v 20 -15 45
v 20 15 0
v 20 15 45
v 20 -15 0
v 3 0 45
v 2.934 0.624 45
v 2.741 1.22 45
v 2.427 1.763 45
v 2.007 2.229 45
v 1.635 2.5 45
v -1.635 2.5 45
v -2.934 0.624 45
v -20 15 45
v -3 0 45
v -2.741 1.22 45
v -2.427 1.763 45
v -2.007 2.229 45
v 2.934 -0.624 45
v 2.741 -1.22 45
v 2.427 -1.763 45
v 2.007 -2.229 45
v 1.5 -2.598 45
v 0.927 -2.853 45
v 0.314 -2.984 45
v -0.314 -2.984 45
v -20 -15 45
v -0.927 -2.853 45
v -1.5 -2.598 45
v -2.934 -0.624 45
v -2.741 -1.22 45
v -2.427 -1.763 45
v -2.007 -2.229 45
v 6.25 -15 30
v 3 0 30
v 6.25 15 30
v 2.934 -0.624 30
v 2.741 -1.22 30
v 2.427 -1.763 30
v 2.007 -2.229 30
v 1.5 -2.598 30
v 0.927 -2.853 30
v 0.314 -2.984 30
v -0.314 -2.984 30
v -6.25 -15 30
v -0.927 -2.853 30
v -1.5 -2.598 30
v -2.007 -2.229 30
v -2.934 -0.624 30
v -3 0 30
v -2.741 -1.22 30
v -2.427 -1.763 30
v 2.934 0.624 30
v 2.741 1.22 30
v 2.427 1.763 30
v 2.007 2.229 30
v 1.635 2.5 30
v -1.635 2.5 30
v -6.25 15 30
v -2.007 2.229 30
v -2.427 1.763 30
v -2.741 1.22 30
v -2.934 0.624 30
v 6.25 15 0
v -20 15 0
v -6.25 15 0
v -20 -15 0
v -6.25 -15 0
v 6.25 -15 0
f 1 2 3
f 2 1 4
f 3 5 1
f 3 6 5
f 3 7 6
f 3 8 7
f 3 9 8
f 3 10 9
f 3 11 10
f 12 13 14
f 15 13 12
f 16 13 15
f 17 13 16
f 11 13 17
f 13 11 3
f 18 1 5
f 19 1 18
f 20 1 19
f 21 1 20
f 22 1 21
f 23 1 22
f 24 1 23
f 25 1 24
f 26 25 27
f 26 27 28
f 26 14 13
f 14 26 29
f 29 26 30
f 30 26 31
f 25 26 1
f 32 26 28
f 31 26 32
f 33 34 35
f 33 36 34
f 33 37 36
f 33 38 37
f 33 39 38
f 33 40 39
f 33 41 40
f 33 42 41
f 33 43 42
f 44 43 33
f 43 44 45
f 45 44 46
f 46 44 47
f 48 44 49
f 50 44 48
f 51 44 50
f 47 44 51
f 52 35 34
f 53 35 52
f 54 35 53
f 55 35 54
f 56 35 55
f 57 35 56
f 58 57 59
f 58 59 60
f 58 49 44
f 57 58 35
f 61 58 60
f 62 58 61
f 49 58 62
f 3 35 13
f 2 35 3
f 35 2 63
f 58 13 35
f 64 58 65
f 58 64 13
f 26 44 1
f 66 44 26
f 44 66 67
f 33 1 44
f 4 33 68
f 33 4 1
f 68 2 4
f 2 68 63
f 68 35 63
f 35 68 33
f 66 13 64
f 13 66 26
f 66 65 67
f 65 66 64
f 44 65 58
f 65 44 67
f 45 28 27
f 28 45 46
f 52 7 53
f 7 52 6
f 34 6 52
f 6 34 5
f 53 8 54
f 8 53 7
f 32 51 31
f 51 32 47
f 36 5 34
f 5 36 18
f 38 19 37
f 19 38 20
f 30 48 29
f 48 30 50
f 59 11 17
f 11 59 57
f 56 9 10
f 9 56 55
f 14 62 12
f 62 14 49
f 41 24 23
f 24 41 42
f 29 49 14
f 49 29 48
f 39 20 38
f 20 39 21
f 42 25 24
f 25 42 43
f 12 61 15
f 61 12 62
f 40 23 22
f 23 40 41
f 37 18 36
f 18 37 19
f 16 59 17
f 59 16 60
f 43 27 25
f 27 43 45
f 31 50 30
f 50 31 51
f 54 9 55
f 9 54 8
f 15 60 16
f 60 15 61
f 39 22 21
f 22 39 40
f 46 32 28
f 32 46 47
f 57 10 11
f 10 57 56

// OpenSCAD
// file: motor_shaft.scad
function motor_shaft_cut_length() = 15;

module motor_shaft(tolerance = 0) {
	shaft_length = 22;
	shaft_radius = 2.5 + tolerance;
	cut_length = motor_shaft_cut_length();
	cut_thickness = 0.5;
	$fs = 0.01;

	difference() {
		cylinder(h=shaft_length, r=shaft_radius);
		translate([-5, shaft_radius-cut_thickness, 0]) {
			cube([10, cut_thickness, cut_length]);
		}
	}
}

motor_shaft();
// main file
use <motor_shaft.scad>;

finger_height = 30;
y_size = 30;

module end_effector_half() {
	spacing_for_knob = 12.5;
	finger_thickness = 13.75;

	union() {
		translate([0, 0, finger_height]) {
			cube([
				spacing_for_knob / 2 + finger_thickness,
				y_size,
				motor_shaft_cut_length(),
			]);
		};
		translate([spacing_for_knob / 2, 0, 0]) {
			cube([finger_thickness, y_size, finger_height]);
		}
	}
}

module end_effector() {
	union() {
		end_effector_half();
		mirror([1, 0, 0]) {
			end_effector_half();
		}
	}
}

difference() {
	translate([0, -y_size / 2, 0]) {
		end_effector();
	}
	translate([0, 0, finger_height]) {
		motor_shaft(tolerance = 0.5);
	}
}
